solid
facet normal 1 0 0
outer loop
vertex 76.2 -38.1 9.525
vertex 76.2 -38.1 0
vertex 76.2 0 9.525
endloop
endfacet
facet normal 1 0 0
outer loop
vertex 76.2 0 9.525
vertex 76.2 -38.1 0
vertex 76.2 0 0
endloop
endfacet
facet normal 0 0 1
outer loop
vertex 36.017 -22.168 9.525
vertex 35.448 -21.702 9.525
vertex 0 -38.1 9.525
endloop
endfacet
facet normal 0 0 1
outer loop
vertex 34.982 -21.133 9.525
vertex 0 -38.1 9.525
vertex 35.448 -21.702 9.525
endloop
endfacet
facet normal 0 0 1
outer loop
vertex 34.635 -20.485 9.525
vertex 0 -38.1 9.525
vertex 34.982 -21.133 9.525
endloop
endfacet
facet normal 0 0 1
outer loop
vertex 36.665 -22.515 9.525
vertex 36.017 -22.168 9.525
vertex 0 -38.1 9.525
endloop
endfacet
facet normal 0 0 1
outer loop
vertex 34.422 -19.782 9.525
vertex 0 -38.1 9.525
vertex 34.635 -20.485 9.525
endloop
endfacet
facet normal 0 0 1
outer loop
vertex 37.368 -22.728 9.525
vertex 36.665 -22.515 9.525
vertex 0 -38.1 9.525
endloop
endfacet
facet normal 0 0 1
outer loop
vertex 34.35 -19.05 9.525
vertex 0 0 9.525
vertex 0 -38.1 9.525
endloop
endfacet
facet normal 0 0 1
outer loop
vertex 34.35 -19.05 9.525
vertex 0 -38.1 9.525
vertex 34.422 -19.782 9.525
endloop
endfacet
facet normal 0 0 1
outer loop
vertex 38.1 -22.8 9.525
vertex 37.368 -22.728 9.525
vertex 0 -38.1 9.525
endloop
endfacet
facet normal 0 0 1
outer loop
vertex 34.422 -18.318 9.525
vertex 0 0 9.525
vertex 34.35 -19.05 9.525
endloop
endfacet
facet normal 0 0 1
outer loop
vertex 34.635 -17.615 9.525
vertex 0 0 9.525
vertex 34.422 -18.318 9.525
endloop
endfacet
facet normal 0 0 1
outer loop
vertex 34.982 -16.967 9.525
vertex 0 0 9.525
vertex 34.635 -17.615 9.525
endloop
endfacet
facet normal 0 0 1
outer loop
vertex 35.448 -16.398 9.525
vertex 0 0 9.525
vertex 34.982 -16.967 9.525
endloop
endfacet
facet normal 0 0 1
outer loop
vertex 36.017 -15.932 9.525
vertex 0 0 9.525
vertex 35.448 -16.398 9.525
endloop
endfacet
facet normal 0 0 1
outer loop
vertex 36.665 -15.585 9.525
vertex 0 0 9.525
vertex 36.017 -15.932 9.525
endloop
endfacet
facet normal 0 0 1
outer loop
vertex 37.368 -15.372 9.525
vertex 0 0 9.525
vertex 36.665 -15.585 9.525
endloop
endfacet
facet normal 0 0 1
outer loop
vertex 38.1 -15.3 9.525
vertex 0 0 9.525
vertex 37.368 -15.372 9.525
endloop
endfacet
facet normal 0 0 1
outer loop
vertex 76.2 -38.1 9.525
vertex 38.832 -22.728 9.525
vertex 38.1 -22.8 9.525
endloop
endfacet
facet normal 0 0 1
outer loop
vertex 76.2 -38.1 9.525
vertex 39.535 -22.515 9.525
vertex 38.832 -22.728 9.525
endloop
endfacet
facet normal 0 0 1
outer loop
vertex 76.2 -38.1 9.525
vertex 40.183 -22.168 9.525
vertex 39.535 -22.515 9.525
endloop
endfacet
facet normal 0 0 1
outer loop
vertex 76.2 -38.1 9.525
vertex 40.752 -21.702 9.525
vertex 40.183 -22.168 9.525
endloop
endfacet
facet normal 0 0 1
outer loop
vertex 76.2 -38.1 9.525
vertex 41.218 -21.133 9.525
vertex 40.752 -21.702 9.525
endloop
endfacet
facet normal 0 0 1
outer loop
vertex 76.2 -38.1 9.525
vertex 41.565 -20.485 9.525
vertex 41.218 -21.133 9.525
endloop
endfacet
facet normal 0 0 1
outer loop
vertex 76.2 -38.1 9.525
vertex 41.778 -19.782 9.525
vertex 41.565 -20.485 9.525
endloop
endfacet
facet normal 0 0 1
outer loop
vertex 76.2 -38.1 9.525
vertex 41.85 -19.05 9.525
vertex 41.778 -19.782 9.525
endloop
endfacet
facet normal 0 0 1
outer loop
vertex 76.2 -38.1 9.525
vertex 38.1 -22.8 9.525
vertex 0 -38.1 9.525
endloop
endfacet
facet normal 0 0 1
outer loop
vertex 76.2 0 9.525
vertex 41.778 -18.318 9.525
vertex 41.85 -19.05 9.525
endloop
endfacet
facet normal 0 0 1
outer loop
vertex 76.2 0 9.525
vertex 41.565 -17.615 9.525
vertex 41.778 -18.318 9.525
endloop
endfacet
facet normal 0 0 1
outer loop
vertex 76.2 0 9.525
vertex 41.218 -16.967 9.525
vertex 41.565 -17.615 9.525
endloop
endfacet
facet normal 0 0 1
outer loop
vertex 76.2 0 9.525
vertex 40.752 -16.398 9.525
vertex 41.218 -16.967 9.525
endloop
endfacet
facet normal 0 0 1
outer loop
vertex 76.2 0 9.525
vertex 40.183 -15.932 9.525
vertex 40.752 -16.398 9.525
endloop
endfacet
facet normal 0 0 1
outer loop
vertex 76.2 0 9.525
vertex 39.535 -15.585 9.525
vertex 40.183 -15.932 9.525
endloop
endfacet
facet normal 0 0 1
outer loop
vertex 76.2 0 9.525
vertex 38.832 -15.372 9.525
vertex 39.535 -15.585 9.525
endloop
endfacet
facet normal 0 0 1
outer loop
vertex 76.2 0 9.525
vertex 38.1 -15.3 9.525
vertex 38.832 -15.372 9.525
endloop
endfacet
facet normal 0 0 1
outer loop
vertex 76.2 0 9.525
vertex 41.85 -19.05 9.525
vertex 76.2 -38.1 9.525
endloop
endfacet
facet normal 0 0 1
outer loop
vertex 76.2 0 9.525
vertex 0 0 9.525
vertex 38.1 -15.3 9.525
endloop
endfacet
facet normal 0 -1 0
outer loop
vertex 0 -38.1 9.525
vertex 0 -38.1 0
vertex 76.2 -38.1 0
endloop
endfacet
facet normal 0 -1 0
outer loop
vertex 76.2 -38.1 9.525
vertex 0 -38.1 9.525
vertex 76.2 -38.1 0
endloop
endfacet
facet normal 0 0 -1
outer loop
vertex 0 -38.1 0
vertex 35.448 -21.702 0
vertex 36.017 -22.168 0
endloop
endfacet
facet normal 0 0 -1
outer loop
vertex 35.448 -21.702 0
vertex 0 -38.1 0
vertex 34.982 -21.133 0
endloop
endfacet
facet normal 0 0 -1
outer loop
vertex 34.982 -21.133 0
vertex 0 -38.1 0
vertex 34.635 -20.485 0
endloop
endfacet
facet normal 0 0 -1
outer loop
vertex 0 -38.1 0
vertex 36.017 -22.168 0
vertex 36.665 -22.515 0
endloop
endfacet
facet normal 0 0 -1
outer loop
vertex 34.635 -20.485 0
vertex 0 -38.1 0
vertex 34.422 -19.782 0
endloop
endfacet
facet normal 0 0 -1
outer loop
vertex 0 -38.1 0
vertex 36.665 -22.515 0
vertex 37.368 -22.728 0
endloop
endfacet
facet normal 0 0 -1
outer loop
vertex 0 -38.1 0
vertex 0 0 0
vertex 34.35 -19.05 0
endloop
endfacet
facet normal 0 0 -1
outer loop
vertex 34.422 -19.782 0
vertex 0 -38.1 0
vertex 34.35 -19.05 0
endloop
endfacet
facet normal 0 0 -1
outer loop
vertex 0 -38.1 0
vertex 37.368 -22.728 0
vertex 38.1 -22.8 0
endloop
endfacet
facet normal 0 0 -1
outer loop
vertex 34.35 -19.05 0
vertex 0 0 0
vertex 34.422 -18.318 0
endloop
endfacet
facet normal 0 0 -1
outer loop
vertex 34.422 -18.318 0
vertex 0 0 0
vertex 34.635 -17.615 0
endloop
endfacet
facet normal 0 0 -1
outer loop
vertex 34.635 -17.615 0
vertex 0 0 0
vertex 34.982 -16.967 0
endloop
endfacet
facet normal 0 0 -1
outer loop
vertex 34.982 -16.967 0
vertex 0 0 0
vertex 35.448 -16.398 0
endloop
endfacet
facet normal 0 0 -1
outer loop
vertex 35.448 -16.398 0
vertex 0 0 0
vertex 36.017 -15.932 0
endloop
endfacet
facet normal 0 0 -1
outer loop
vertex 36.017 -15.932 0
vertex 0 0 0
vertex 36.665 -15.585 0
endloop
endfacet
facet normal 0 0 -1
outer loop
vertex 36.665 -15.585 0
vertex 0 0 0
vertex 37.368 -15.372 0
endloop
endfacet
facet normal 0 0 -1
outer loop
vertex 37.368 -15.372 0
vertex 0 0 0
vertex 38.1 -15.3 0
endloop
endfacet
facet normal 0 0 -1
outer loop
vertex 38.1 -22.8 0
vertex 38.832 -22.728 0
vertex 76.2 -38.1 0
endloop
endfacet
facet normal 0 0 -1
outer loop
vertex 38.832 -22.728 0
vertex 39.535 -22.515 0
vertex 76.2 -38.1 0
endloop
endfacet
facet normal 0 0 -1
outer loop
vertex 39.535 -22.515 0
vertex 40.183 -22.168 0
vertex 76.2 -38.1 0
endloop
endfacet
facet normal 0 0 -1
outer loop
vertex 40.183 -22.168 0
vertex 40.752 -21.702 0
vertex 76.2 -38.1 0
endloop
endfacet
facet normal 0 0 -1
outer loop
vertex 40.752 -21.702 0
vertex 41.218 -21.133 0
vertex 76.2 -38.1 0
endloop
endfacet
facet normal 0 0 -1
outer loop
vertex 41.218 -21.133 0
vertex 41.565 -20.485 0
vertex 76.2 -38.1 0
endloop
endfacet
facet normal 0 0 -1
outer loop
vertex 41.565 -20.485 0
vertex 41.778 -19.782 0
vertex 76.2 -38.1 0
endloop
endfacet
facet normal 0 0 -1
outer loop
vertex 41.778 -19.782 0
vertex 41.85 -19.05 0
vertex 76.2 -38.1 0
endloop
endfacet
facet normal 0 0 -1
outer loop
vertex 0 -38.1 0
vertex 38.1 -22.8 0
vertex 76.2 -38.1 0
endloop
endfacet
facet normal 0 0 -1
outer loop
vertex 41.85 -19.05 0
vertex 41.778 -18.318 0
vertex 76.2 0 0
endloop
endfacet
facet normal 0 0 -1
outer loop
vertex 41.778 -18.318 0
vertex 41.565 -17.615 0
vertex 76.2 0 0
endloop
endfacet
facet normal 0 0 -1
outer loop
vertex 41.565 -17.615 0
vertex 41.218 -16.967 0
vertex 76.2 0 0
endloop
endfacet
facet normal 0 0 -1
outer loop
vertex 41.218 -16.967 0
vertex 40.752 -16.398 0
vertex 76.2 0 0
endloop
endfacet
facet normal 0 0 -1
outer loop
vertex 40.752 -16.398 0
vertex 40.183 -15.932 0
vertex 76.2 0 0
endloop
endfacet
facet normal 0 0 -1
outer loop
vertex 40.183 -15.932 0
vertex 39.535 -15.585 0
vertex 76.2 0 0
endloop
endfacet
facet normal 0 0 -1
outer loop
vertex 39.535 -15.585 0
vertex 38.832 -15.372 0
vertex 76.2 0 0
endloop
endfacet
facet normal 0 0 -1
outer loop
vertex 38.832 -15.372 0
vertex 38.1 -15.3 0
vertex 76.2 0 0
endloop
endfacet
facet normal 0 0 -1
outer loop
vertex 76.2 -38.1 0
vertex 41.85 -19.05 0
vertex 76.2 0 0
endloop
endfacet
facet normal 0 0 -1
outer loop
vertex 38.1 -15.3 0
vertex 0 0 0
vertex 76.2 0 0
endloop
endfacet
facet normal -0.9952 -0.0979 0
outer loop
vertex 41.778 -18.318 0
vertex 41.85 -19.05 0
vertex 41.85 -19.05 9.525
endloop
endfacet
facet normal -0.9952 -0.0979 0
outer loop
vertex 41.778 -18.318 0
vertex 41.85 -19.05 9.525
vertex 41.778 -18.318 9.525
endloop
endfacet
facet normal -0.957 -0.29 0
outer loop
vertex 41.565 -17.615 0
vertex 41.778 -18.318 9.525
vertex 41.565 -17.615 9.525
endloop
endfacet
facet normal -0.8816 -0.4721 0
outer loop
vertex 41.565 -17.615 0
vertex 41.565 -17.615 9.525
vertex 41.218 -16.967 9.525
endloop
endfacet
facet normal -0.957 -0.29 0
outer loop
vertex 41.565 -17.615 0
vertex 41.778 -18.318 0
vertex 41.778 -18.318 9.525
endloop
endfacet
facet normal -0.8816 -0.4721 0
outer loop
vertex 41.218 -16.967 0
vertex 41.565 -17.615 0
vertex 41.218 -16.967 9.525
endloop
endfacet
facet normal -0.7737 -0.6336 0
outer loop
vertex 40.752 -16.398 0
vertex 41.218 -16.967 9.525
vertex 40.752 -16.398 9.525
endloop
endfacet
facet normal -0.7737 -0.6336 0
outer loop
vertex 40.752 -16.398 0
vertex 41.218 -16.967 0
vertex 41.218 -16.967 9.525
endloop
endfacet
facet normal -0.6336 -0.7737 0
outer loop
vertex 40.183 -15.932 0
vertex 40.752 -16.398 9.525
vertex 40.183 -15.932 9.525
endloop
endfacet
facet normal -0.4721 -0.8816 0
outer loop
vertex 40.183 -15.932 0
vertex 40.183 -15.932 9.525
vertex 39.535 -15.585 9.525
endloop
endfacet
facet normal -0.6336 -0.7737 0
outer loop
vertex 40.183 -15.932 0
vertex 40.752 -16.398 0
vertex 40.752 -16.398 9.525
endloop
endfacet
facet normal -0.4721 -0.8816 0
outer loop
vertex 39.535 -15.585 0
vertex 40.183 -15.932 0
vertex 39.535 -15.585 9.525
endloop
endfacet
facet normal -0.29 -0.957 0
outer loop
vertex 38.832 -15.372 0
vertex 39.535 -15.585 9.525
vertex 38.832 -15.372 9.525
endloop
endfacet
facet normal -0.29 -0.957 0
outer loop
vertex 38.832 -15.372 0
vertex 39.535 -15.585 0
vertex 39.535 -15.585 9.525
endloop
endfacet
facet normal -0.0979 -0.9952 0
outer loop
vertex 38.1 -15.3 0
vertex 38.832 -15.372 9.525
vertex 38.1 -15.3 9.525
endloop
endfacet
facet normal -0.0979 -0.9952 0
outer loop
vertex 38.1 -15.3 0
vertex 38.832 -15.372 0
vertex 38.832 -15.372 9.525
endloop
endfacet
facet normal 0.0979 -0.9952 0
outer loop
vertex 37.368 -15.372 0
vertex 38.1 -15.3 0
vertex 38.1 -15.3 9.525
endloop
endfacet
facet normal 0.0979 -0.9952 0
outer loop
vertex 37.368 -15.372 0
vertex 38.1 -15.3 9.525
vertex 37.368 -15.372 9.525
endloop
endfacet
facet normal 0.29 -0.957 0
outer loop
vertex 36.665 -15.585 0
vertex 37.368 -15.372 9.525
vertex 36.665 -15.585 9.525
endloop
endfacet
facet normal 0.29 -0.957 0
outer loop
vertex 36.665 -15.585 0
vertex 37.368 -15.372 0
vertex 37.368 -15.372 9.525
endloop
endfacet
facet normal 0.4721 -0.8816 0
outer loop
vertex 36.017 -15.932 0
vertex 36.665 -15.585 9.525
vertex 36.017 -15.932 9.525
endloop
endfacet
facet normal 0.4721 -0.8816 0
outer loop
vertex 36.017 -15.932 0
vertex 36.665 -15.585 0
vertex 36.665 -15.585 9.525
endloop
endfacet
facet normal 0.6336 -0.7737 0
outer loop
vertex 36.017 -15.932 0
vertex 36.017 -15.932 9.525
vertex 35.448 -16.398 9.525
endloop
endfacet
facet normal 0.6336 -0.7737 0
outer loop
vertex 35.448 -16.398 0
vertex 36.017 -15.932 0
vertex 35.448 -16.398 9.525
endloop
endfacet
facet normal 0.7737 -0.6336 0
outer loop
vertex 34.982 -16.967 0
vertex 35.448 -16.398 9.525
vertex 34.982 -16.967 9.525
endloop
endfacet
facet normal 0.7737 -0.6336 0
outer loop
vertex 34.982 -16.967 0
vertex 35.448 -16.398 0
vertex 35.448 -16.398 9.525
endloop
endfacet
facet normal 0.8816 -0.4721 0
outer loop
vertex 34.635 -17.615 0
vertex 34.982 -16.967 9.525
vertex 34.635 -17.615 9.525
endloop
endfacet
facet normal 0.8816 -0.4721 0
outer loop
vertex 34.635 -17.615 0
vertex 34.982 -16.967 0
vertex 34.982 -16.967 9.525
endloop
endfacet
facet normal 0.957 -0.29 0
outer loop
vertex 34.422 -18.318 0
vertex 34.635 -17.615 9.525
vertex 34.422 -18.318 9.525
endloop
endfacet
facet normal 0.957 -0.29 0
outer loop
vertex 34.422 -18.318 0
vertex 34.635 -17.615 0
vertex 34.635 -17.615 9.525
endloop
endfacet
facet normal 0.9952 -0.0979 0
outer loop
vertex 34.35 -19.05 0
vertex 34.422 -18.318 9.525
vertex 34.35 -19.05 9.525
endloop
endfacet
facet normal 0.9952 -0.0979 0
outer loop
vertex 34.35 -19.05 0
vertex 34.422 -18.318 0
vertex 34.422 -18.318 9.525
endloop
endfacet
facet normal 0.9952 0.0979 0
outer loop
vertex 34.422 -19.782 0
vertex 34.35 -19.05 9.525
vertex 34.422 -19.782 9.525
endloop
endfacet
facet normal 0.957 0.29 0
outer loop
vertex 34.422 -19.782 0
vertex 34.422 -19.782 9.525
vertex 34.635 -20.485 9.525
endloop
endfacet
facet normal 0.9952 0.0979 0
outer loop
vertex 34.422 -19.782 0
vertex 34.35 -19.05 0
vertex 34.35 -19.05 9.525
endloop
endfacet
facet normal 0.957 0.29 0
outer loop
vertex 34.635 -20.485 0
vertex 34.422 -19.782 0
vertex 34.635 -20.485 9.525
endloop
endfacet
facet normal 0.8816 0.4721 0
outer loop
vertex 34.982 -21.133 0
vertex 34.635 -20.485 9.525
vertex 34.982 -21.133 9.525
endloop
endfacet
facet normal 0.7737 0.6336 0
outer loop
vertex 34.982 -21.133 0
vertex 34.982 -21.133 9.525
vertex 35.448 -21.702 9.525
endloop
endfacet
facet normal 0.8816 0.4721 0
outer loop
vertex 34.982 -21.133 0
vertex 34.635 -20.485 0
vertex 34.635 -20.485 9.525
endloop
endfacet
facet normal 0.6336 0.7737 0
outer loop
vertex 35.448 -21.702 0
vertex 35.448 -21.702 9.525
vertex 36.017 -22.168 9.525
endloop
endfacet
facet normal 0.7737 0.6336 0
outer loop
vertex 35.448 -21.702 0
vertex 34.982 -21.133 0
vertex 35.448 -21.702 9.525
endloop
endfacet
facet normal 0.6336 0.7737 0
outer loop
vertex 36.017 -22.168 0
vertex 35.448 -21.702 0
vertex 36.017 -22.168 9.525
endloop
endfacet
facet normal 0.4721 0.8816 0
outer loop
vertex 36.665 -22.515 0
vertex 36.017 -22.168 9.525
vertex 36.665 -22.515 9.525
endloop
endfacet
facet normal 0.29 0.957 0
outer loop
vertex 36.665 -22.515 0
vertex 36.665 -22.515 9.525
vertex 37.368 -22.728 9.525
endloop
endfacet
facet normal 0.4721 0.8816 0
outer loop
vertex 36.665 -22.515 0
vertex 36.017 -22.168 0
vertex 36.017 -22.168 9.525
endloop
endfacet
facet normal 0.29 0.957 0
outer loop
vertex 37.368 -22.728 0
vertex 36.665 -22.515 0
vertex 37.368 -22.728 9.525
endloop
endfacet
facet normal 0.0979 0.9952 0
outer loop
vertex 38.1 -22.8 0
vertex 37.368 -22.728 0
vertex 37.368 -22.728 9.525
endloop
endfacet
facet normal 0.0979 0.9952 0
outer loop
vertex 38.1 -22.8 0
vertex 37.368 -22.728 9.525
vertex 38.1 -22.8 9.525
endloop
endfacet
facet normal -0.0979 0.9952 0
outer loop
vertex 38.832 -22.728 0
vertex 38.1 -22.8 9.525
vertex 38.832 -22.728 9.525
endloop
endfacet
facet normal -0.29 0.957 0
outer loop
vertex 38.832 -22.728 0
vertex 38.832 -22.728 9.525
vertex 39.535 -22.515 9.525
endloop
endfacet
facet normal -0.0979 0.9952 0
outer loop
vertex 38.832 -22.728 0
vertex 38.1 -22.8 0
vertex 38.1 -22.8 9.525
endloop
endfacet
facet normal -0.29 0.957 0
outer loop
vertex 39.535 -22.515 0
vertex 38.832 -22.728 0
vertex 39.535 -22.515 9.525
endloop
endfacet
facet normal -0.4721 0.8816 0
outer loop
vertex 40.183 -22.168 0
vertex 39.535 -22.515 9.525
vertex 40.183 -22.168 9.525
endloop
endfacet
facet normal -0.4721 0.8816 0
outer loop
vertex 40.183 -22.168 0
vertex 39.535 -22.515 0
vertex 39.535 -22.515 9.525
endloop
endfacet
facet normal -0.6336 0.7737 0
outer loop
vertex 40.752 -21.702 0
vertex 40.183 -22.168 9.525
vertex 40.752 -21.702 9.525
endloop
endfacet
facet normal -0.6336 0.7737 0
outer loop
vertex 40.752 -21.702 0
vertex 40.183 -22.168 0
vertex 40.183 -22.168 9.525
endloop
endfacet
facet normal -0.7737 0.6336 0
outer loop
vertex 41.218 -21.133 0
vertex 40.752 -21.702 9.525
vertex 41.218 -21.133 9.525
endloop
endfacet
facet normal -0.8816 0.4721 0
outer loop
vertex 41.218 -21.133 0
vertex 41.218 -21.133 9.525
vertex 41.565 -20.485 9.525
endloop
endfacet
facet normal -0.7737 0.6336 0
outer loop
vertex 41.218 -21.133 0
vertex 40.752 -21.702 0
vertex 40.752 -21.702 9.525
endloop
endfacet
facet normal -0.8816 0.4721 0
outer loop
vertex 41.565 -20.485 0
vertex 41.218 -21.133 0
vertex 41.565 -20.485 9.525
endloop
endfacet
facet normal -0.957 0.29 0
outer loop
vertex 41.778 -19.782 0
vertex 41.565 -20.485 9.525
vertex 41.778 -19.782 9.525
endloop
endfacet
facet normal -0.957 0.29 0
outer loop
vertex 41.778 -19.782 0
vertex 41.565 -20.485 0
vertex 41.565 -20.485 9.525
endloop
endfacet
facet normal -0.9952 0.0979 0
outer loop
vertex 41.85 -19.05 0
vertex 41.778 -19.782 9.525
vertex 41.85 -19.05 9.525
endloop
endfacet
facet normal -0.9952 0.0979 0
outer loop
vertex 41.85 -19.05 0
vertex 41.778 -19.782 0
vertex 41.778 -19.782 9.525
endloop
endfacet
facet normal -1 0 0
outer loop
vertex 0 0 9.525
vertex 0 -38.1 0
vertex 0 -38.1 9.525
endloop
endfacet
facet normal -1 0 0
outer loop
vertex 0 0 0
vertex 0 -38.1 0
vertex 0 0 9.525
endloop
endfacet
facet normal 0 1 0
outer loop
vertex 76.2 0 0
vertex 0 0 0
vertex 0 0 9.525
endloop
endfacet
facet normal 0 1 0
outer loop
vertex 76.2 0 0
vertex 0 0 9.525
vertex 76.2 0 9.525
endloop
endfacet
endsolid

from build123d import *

# Parameters (mm, degrees)
SKETCH1_W           = 76.2
SKETCH1_H           = 38.1
SKETCH1_W_2         = 28
SKETCH1_H_2         = 28
SKETCH1_R           = 3.75
BOSS_EXTRUDE1_DEPTH = 9.525


with BuildPart() as part:
    # Sketch1 → Boss-Extrude1 (new body)
    with BuildSketch(Plane.XY):
        with Locations((38.1, -19.05)):
            Rectangle(SKETCH1_W, SKETCH1_H)
        with Locations((38.1, -19.05)):
            Rectangle(SKETCH1_W_2, SKETCH1_H_2, mode=Mode.SUBTRACT)
        with Locations((38.1, -19.05)):
            Rectangle(SKETCH1_W_2, SKETCH1_H_2)
        with Locations((38.1, -19.05)):
            Circle(SKETCH1_R, mode=Mode.SUBTRACT)
    extrude(amount=BOSS_EXTRUDE1_DEPTH)


solid = part.part
